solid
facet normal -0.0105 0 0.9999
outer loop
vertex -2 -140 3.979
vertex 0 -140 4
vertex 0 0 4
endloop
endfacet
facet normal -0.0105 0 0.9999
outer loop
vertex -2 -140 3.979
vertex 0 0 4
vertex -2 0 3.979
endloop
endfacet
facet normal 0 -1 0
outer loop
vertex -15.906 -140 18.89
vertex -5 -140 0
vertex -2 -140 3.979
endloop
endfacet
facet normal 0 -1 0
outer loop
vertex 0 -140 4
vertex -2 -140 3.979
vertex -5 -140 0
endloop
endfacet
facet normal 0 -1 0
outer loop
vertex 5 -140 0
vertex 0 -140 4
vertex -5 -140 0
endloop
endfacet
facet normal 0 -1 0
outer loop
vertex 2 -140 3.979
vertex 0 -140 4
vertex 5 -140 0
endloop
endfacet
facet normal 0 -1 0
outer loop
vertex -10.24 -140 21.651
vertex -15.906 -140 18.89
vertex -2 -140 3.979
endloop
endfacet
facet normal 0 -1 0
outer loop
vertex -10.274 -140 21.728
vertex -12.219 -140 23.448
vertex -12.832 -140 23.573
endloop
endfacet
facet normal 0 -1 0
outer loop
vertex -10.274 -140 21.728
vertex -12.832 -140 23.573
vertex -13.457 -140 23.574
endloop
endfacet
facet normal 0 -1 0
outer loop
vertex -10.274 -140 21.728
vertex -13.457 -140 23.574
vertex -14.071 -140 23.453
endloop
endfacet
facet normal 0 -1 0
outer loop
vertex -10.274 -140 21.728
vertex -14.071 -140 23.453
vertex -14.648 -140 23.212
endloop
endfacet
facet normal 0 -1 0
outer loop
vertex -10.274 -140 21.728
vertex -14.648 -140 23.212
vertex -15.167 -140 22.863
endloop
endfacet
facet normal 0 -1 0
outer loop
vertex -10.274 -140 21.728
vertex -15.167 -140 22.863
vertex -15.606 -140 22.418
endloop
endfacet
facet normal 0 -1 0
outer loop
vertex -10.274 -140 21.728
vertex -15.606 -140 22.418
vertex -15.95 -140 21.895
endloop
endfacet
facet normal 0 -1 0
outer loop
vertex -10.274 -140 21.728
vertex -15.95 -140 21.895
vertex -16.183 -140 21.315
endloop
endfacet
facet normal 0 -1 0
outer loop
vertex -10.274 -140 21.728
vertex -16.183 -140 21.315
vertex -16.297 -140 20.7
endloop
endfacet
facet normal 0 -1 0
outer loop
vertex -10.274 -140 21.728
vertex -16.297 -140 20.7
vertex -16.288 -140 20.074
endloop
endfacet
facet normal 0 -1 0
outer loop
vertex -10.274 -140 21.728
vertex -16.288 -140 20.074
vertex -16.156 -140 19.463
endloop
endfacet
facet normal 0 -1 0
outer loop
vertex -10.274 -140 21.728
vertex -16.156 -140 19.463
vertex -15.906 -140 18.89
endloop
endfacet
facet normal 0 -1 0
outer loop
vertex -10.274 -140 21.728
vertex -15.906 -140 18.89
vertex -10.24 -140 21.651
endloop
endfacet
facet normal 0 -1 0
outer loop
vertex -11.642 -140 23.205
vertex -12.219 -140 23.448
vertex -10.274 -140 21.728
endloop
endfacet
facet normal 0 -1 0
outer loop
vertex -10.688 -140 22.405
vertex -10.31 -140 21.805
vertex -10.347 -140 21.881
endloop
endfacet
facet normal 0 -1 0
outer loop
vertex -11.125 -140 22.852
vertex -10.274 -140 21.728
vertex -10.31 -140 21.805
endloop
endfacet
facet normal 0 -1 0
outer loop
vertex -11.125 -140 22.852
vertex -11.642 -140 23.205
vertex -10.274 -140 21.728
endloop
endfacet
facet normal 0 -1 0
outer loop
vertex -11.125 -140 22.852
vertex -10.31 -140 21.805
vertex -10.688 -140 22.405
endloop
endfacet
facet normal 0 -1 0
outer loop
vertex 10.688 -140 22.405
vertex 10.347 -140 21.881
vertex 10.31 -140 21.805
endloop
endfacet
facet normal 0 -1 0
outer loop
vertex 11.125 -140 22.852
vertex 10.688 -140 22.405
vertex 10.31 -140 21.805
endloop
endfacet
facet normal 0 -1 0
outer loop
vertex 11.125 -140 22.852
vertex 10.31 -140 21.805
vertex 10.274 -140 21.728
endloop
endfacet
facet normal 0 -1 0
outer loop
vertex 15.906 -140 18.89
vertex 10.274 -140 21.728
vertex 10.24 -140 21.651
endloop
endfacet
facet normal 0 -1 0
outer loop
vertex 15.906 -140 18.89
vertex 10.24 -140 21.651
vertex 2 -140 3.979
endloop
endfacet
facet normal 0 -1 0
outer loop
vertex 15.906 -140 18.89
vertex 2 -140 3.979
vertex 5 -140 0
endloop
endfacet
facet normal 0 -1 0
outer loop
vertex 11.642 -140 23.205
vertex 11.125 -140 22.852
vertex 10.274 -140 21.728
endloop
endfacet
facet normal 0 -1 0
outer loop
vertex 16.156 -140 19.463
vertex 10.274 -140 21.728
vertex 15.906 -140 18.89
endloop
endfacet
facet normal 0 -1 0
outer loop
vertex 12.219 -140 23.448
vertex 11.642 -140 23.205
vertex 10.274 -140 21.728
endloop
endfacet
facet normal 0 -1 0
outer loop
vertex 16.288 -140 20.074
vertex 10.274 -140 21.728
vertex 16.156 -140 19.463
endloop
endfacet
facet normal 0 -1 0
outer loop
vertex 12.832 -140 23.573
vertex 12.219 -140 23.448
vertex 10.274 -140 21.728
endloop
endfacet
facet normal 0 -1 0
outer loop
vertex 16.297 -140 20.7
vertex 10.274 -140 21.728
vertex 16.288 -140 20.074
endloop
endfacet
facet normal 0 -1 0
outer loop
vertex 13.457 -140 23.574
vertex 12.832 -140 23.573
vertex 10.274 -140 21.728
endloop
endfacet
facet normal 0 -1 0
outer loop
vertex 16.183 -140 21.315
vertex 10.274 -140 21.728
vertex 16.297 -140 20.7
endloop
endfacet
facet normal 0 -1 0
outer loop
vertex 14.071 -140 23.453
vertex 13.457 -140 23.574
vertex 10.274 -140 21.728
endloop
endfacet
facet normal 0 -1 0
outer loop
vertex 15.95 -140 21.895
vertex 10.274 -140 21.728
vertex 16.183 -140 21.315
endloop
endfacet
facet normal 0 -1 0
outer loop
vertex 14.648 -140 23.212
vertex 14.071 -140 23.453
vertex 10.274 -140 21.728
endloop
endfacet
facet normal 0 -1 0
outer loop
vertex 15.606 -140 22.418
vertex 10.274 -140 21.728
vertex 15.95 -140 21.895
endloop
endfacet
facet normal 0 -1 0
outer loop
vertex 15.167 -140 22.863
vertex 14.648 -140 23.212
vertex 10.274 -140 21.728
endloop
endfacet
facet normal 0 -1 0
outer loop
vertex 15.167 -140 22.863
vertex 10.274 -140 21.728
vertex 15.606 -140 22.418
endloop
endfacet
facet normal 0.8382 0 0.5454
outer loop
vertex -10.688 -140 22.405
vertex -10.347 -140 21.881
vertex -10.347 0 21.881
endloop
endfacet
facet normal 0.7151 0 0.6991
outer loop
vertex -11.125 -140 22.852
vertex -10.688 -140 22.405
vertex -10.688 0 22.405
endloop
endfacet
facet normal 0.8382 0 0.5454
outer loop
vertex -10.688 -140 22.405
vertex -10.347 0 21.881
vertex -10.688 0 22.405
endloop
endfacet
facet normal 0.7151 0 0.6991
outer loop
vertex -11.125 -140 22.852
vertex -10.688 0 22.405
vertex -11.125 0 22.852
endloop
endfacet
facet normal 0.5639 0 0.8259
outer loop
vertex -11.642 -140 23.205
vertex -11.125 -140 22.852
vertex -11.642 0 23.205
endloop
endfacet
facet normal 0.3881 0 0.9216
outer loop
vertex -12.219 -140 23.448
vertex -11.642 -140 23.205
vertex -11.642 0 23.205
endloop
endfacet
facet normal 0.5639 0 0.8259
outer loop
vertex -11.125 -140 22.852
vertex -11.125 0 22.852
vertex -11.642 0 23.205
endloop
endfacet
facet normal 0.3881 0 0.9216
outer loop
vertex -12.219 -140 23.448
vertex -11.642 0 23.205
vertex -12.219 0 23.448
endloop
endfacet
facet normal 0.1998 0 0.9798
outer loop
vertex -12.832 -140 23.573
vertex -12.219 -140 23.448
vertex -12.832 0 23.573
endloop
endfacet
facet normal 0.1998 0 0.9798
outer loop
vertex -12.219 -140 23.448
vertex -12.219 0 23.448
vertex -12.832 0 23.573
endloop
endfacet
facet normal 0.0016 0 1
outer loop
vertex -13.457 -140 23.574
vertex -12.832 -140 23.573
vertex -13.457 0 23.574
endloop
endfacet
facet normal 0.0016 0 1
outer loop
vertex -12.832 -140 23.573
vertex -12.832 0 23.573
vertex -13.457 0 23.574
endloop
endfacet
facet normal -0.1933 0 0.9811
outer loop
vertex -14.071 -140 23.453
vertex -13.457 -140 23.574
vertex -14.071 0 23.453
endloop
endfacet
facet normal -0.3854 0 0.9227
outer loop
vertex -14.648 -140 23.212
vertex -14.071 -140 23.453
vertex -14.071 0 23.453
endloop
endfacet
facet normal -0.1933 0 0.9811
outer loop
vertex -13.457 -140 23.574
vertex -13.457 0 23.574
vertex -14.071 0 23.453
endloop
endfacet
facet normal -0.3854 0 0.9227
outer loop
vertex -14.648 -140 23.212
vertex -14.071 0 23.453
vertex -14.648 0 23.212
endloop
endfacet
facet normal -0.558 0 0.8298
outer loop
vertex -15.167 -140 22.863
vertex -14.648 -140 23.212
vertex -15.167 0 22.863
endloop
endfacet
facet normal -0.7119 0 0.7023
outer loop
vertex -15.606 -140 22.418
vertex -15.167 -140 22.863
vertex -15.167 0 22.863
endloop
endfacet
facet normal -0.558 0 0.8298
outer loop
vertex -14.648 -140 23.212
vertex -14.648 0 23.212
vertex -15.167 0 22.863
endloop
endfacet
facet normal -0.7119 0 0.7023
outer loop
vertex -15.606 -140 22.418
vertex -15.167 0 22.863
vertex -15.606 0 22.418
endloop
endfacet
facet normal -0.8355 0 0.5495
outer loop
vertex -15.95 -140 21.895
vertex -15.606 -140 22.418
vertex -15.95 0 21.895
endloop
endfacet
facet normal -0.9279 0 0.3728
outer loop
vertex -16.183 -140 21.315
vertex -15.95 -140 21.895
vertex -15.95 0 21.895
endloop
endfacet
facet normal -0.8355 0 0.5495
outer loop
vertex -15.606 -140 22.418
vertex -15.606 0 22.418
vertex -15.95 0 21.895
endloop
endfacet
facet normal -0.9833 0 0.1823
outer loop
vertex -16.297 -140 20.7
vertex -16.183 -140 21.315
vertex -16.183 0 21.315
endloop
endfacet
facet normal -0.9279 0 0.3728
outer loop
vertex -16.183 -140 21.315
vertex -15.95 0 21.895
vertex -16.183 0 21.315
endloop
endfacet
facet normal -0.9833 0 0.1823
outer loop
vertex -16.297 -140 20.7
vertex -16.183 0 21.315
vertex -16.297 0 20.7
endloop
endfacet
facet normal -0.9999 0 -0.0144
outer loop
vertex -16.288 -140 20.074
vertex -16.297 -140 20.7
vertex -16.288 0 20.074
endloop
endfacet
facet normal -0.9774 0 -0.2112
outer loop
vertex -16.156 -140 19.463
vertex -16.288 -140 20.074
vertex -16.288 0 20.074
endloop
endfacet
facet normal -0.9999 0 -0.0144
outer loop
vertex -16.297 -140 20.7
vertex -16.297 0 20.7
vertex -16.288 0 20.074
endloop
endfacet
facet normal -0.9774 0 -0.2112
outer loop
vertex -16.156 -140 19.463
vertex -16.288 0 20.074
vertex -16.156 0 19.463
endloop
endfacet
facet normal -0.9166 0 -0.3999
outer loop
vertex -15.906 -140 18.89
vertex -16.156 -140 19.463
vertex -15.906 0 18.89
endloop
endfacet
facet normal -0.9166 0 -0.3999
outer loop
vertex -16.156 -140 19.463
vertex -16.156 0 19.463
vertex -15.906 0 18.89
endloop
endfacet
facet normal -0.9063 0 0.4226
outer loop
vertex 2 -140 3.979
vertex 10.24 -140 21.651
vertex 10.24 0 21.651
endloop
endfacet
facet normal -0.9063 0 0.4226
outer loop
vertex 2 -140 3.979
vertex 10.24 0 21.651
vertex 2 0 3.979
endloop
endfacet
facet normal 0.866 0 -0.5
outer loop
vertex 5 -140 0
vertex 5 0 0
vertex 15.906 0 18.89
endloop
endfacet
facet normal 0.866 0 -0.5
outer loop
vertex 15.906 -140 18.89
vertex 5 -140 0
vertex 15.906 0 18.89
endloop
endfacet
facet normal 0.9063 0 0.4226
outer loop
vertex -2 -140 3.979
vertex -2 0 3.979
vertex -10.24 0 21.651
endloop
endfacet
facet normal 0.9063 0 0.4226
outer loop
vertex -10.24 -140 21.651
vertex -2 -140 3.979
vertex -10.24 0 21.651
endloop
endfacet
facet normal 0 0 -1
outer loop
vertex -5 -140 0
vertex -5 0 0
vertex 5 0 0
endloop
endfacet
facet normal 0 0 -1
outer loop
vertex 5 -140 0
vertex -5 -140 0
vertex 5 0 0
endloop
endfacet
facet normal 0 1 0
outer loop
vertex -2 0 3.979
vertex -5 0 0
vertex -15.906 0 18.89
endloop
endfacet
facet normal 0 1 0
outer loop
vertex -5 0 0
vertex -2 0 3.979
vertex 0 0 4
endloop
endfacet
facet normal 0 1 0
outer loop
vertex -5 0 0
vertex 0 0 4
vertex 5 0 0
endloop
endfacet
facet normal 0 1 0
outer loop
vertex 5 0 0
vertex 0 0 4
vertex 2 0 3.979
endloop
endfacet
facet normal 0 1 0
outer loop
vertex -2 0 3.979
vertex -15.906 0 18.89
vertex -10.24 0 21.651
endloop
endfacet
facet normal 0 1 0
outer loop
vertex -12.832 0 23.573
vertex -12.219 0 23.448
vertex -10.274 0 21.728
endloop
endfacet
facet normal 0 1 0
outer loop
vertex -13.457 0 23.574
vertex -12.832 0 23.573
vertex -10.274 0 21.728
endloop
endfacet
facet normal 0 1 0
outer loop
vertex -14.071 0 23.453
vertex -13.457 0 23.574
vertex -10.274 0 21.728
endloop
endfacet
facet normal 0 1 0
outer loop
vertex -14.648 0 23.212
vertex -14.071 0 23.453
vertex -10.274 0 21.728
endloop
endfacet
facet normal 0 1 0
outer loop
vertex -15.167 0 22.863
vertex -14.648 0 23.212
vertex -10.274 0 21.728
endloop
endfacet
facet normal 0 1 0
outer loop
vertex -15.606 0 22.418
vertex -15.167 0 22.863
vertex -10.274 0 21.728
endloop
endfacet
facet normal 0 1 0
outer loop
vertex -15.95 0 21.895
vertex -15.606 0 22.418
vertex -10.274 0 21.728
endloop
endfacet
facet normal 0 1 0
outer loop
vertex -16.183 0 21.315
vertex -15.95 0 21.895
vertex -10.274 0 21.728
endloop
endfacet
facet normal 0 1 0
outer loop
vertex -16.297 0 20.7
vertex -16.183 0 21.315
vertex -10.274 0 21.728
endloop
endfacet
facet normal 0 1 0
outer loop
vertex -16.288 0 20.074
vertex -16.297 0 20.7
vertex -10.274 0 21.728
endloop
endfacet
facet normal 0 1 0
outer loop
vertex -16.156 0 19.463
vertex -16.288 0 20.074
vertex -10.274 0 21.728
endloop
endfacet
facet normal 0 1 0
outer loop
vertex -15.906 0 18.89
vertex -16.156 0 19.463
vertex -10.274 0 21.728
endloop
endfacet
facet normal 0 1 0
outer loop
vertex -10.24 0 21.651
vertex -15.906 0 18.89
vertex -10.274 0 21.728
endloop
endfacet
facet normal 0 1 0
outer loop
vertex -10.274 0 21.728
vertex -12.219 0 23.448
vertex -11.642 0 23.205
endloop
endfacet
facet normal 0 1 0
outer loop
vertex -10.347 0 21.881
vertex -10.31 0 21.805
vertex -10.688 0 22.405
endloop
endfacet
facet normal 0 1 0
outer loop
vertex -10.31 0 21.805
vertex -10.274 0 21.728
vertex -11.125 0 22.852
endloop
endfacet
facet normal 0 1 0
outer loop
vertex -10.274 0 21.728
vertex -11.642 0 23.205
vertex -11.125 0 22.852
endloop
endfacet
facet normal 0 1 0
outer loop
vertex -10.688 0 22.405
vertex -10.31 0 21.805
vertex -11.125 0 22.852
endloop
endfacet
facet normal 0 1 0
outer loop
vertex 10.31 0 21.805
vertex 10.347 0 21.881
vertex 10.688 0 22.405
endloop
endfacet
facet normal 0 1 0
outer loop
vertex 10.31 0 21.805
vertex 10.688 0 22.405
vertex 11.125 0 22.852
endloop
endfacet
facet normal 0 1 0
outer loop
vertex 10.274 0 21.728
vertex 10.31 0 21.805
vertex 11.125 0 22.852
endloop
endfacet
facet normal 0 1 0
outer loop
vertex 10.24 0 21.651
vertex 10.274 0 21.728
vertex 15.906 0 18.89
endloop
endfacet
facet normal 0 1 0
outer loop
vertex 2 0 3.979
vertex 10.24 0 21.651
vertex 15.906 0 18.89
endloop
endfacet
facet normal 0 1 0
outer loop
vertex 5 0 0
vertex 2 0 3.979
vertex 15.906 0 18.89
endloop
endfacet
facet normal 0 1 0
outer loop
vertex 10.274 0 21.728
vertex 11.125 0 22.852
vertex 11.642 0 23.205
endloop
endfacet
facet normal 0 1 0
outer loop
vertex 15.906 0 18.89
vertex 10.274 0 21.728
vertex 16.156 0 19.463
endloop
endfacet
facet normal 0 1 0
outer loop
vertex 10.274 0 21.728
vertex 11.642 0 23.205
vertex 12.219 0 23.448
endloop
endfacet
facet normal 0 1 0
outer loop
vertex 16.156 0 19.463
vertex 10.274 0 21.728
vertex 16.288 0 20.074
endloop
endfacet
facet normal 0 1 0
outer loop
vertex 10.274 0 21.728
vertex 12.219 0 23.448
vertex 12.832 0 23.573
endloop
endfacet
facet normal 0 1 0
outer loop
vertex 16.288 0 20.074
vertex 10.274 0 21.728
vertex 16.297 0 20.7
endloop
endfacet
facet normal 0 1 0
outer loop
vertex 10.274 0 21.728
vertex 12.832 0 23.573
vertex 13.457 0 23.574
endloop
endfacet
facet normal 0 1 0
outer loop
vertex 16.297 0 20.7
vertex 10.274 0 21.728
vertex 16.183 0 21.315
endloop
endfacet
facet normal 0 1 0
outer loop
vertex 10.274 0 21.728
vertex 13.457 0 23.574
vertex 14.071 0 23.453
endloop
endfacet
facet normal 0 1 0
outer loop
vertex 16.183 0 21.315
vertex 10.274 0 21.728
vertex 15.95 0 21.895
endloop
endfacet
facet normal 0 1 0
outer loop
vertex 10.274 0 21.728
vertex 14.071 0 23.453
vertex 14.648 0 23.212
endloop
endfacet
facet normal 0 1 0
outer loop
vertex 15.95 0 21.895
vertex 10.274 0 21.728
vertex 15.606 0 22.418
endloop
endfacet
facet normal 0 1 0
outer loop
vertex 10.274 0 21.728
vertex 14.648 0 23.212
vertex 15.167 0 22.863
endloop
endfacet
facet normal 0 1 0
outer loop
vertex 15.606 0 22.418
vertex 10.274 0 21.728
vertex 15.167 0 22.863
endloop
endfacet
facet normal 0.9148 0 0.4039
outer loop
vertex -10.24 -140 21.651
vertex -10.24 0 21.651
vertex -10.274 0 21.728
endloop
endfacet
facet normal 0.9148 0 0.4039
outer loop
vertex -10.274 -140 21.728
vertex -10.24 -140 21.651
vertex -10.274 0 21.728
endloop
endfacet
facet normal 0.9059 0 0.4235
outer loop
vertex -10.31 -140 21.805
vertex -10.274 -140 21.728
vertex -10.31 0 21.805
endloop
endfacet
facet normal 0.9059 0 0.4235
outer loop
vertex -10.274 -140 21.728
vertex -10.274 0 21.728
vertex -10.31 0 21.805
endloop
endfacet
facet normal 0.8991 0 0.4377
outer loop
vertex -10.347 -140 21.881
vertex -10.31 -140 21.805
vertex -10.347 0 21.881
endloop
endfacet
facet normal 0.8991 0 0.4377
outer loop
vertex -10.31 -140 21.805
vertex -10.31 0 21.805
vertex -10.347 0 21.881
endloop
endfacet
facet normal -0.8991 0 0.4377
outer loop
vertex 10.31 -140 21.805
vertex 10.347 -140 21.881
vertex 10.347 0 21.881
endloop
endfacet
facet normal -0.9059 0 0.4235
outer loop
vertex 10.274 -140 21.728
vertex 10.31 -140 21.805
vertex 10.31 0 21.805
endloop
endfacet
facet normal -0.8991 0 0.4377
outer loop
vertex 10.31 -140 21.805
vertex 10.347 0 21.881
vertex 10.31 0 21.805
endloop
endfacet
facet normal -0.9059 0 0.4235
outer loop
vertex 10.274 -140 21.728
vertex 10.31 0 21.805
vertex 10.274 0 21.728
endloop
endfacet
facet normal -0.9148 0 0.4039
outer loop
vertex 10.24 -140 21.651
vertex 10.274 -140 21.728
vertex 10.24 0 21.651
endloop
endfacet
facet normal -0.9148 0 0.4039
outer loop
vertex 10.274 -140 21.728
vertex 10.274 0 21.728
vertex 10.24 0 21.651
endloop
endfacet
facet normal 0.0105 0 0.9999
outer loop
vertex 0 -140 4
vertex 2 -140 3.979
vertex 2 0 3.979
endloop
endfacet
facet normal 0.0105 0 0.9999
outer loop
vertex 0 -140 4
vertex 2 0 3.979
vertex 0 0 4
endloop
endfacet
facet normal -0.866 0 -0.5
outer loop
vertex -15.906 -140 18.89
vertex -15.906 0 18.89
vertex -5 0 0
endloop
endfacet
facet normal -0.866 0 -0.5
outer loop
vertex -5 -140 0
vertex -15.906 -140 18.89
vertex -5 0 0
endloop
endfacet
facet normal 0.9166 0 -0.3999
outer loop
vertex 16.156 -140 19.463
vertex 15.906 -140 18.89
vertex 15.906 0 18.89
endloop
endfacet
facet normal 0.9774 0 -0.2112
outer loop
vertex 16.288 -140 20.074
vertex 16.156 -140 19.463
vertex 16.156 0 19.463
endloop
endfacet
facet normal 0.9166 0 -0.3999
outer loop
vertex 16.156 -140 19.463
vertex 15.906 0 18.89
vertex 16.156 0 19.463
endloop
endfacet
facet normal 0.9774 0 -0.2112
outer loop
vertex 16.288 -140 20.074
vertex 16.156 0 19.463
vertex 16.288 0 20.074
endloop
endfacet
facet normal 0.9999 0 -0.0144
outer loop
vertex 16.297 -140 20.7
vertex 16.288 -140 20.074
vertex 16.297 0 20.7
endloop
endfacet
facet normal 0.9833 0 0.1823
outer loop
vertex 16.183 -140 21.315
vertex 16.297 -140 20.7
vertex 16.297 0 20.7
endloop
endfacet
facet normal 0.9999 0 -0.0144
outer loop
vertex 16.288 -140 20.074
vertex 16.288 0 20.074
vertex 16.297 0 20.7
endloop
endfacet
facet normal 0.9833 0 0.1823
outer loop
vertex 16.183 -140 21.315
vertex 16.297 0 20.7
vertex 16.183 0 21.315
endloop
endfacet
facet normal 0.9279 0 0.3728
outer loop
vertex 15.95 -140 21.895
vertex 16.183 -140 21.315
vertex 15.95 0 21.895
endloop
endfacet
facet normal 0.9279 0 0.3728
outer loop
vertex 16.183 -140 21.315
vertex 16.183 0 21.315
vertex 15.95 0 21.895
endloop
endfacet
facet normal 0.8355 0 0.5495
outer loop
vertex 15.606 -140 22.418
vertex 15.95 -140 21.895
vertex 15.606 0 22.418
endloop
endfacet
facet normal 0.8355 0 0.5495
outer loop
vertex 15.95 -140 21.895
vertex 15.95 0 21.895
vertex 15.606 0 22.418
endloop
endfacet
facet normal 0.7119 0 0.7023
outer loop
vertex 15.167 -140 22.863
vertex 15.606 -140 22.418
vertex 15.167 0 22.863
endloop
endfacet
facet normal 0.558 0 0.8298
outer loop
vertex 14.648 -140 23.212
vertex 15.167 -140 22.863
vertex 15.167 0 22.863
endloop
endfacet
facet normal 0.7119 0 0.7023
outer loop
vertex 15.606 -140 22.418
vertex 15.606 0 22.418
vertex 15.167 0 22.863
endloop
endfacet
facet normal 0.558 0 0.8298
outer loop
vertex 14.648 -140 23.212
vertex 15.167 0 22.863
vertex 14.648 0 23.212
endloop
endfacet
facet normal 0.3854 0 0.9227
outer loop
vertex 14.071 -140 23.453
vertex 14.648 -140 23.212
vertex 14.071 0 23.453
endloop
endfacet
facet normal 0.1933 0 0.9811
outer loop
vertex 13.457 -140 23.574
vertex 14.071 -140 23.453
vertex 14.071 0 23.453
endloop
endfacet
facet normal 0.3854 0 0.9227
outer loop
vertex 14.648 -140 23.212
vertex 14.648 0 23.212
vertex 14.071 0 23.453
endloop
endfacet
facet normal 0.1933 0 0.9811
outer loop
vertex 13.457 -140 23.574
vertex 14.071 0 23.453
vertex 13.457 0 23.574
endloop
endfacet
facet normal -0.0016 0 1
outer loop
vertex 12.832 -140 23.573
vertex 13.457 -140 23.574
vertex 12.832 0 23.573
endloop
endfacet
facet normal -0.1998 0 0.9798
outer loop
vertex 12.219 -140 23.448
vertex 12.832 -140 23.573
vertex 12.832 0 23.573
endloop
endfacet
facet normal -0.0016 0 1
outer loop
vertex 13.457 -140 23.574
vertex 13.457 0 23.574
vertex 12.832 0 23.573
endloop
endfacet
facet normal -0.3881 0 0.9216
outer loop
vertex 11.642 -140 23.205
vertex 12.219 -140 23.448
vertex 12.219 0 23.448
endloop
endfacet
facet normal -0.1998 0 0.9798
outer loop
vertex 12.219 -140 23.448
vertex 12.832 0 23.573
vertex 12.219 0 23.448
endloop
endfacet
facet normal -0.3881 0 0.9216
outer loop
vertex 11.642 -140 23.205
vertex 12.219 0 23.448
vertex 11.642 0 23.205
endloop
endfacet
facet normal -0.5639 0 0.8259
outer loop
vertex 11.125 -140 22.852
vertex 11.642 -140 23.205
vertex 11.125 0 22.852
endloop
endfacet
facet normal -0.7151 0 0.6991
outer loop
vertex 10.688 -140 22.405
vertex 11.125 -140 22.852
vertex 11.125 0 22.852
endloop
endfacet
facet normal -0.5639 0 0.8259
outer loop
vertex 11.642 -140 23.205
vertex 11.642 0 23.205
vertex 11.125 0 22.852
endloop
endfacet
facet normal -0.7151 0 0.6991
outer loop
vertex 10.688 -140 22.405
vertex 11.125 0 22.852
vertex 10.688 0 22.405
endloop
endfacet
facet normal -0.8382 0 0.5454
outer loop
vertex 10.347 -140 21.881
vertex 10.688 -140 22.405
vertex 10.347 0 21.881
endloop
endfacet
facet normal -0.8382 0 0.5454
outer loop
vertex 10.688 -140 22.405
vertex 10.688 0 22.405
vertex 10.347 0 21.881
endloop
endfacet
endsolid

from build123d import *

# Parameters (mm, degrees)
F1_DEPTH = 140


with BuildPart() as f1:
    # F0 (on Front) → F1 (new body)
    with BuildSketch(Plane.XZ):
        with BuildLine():
            Line((-5, 0), (0, 0))
            Line((0, 0), (5, 0))
            Line((5, 0), (15.905888, 18.889553))
            ThreePointArc((15.905888, 18.889553), (14.648043, 23.212289), (10.347496, 21.880553))
            Line((10.347496, 21.880553), (10.240284, 21.650635))
            Line((10.240284, 21.650635), (1.99989, 3.979054))
            Line((1.99989, 3.979054), (0, 4))
            Line((0, 4), (-1.99989, 3.979054))
            Line((-1.99989, 3.979054), (-10.240284, 21.650635))
            Line((-10.240284, 21.650635), (-10.347496, 21.880553))
            ThreePointArc((-10.347496, 21.880553), (-14.648043, 23.212289), (-15.905888, 18.889553))
            Line((-15.905888, 18.889553), (-5, 0))
        make_face()
        with BuildLine():
            Line((10.240284, 21.650635), (10.347496, 21.880553))
            ThreePointArc((10.347496, 21.880553), (10.29158, 21.766671), (10.240284, 21.650635))
        make_face()
        with BuildLine():
            ThreePointArc((-10.240284, 21.650635), (-10.29158, 21.766671), (-10.347496, 21.880553))
            Line((-10.347496, 21.880553), (-10.240284, 21.650635))
        make_face()
    extrude(amount=F1_DEPTH)


solid = f1.part
